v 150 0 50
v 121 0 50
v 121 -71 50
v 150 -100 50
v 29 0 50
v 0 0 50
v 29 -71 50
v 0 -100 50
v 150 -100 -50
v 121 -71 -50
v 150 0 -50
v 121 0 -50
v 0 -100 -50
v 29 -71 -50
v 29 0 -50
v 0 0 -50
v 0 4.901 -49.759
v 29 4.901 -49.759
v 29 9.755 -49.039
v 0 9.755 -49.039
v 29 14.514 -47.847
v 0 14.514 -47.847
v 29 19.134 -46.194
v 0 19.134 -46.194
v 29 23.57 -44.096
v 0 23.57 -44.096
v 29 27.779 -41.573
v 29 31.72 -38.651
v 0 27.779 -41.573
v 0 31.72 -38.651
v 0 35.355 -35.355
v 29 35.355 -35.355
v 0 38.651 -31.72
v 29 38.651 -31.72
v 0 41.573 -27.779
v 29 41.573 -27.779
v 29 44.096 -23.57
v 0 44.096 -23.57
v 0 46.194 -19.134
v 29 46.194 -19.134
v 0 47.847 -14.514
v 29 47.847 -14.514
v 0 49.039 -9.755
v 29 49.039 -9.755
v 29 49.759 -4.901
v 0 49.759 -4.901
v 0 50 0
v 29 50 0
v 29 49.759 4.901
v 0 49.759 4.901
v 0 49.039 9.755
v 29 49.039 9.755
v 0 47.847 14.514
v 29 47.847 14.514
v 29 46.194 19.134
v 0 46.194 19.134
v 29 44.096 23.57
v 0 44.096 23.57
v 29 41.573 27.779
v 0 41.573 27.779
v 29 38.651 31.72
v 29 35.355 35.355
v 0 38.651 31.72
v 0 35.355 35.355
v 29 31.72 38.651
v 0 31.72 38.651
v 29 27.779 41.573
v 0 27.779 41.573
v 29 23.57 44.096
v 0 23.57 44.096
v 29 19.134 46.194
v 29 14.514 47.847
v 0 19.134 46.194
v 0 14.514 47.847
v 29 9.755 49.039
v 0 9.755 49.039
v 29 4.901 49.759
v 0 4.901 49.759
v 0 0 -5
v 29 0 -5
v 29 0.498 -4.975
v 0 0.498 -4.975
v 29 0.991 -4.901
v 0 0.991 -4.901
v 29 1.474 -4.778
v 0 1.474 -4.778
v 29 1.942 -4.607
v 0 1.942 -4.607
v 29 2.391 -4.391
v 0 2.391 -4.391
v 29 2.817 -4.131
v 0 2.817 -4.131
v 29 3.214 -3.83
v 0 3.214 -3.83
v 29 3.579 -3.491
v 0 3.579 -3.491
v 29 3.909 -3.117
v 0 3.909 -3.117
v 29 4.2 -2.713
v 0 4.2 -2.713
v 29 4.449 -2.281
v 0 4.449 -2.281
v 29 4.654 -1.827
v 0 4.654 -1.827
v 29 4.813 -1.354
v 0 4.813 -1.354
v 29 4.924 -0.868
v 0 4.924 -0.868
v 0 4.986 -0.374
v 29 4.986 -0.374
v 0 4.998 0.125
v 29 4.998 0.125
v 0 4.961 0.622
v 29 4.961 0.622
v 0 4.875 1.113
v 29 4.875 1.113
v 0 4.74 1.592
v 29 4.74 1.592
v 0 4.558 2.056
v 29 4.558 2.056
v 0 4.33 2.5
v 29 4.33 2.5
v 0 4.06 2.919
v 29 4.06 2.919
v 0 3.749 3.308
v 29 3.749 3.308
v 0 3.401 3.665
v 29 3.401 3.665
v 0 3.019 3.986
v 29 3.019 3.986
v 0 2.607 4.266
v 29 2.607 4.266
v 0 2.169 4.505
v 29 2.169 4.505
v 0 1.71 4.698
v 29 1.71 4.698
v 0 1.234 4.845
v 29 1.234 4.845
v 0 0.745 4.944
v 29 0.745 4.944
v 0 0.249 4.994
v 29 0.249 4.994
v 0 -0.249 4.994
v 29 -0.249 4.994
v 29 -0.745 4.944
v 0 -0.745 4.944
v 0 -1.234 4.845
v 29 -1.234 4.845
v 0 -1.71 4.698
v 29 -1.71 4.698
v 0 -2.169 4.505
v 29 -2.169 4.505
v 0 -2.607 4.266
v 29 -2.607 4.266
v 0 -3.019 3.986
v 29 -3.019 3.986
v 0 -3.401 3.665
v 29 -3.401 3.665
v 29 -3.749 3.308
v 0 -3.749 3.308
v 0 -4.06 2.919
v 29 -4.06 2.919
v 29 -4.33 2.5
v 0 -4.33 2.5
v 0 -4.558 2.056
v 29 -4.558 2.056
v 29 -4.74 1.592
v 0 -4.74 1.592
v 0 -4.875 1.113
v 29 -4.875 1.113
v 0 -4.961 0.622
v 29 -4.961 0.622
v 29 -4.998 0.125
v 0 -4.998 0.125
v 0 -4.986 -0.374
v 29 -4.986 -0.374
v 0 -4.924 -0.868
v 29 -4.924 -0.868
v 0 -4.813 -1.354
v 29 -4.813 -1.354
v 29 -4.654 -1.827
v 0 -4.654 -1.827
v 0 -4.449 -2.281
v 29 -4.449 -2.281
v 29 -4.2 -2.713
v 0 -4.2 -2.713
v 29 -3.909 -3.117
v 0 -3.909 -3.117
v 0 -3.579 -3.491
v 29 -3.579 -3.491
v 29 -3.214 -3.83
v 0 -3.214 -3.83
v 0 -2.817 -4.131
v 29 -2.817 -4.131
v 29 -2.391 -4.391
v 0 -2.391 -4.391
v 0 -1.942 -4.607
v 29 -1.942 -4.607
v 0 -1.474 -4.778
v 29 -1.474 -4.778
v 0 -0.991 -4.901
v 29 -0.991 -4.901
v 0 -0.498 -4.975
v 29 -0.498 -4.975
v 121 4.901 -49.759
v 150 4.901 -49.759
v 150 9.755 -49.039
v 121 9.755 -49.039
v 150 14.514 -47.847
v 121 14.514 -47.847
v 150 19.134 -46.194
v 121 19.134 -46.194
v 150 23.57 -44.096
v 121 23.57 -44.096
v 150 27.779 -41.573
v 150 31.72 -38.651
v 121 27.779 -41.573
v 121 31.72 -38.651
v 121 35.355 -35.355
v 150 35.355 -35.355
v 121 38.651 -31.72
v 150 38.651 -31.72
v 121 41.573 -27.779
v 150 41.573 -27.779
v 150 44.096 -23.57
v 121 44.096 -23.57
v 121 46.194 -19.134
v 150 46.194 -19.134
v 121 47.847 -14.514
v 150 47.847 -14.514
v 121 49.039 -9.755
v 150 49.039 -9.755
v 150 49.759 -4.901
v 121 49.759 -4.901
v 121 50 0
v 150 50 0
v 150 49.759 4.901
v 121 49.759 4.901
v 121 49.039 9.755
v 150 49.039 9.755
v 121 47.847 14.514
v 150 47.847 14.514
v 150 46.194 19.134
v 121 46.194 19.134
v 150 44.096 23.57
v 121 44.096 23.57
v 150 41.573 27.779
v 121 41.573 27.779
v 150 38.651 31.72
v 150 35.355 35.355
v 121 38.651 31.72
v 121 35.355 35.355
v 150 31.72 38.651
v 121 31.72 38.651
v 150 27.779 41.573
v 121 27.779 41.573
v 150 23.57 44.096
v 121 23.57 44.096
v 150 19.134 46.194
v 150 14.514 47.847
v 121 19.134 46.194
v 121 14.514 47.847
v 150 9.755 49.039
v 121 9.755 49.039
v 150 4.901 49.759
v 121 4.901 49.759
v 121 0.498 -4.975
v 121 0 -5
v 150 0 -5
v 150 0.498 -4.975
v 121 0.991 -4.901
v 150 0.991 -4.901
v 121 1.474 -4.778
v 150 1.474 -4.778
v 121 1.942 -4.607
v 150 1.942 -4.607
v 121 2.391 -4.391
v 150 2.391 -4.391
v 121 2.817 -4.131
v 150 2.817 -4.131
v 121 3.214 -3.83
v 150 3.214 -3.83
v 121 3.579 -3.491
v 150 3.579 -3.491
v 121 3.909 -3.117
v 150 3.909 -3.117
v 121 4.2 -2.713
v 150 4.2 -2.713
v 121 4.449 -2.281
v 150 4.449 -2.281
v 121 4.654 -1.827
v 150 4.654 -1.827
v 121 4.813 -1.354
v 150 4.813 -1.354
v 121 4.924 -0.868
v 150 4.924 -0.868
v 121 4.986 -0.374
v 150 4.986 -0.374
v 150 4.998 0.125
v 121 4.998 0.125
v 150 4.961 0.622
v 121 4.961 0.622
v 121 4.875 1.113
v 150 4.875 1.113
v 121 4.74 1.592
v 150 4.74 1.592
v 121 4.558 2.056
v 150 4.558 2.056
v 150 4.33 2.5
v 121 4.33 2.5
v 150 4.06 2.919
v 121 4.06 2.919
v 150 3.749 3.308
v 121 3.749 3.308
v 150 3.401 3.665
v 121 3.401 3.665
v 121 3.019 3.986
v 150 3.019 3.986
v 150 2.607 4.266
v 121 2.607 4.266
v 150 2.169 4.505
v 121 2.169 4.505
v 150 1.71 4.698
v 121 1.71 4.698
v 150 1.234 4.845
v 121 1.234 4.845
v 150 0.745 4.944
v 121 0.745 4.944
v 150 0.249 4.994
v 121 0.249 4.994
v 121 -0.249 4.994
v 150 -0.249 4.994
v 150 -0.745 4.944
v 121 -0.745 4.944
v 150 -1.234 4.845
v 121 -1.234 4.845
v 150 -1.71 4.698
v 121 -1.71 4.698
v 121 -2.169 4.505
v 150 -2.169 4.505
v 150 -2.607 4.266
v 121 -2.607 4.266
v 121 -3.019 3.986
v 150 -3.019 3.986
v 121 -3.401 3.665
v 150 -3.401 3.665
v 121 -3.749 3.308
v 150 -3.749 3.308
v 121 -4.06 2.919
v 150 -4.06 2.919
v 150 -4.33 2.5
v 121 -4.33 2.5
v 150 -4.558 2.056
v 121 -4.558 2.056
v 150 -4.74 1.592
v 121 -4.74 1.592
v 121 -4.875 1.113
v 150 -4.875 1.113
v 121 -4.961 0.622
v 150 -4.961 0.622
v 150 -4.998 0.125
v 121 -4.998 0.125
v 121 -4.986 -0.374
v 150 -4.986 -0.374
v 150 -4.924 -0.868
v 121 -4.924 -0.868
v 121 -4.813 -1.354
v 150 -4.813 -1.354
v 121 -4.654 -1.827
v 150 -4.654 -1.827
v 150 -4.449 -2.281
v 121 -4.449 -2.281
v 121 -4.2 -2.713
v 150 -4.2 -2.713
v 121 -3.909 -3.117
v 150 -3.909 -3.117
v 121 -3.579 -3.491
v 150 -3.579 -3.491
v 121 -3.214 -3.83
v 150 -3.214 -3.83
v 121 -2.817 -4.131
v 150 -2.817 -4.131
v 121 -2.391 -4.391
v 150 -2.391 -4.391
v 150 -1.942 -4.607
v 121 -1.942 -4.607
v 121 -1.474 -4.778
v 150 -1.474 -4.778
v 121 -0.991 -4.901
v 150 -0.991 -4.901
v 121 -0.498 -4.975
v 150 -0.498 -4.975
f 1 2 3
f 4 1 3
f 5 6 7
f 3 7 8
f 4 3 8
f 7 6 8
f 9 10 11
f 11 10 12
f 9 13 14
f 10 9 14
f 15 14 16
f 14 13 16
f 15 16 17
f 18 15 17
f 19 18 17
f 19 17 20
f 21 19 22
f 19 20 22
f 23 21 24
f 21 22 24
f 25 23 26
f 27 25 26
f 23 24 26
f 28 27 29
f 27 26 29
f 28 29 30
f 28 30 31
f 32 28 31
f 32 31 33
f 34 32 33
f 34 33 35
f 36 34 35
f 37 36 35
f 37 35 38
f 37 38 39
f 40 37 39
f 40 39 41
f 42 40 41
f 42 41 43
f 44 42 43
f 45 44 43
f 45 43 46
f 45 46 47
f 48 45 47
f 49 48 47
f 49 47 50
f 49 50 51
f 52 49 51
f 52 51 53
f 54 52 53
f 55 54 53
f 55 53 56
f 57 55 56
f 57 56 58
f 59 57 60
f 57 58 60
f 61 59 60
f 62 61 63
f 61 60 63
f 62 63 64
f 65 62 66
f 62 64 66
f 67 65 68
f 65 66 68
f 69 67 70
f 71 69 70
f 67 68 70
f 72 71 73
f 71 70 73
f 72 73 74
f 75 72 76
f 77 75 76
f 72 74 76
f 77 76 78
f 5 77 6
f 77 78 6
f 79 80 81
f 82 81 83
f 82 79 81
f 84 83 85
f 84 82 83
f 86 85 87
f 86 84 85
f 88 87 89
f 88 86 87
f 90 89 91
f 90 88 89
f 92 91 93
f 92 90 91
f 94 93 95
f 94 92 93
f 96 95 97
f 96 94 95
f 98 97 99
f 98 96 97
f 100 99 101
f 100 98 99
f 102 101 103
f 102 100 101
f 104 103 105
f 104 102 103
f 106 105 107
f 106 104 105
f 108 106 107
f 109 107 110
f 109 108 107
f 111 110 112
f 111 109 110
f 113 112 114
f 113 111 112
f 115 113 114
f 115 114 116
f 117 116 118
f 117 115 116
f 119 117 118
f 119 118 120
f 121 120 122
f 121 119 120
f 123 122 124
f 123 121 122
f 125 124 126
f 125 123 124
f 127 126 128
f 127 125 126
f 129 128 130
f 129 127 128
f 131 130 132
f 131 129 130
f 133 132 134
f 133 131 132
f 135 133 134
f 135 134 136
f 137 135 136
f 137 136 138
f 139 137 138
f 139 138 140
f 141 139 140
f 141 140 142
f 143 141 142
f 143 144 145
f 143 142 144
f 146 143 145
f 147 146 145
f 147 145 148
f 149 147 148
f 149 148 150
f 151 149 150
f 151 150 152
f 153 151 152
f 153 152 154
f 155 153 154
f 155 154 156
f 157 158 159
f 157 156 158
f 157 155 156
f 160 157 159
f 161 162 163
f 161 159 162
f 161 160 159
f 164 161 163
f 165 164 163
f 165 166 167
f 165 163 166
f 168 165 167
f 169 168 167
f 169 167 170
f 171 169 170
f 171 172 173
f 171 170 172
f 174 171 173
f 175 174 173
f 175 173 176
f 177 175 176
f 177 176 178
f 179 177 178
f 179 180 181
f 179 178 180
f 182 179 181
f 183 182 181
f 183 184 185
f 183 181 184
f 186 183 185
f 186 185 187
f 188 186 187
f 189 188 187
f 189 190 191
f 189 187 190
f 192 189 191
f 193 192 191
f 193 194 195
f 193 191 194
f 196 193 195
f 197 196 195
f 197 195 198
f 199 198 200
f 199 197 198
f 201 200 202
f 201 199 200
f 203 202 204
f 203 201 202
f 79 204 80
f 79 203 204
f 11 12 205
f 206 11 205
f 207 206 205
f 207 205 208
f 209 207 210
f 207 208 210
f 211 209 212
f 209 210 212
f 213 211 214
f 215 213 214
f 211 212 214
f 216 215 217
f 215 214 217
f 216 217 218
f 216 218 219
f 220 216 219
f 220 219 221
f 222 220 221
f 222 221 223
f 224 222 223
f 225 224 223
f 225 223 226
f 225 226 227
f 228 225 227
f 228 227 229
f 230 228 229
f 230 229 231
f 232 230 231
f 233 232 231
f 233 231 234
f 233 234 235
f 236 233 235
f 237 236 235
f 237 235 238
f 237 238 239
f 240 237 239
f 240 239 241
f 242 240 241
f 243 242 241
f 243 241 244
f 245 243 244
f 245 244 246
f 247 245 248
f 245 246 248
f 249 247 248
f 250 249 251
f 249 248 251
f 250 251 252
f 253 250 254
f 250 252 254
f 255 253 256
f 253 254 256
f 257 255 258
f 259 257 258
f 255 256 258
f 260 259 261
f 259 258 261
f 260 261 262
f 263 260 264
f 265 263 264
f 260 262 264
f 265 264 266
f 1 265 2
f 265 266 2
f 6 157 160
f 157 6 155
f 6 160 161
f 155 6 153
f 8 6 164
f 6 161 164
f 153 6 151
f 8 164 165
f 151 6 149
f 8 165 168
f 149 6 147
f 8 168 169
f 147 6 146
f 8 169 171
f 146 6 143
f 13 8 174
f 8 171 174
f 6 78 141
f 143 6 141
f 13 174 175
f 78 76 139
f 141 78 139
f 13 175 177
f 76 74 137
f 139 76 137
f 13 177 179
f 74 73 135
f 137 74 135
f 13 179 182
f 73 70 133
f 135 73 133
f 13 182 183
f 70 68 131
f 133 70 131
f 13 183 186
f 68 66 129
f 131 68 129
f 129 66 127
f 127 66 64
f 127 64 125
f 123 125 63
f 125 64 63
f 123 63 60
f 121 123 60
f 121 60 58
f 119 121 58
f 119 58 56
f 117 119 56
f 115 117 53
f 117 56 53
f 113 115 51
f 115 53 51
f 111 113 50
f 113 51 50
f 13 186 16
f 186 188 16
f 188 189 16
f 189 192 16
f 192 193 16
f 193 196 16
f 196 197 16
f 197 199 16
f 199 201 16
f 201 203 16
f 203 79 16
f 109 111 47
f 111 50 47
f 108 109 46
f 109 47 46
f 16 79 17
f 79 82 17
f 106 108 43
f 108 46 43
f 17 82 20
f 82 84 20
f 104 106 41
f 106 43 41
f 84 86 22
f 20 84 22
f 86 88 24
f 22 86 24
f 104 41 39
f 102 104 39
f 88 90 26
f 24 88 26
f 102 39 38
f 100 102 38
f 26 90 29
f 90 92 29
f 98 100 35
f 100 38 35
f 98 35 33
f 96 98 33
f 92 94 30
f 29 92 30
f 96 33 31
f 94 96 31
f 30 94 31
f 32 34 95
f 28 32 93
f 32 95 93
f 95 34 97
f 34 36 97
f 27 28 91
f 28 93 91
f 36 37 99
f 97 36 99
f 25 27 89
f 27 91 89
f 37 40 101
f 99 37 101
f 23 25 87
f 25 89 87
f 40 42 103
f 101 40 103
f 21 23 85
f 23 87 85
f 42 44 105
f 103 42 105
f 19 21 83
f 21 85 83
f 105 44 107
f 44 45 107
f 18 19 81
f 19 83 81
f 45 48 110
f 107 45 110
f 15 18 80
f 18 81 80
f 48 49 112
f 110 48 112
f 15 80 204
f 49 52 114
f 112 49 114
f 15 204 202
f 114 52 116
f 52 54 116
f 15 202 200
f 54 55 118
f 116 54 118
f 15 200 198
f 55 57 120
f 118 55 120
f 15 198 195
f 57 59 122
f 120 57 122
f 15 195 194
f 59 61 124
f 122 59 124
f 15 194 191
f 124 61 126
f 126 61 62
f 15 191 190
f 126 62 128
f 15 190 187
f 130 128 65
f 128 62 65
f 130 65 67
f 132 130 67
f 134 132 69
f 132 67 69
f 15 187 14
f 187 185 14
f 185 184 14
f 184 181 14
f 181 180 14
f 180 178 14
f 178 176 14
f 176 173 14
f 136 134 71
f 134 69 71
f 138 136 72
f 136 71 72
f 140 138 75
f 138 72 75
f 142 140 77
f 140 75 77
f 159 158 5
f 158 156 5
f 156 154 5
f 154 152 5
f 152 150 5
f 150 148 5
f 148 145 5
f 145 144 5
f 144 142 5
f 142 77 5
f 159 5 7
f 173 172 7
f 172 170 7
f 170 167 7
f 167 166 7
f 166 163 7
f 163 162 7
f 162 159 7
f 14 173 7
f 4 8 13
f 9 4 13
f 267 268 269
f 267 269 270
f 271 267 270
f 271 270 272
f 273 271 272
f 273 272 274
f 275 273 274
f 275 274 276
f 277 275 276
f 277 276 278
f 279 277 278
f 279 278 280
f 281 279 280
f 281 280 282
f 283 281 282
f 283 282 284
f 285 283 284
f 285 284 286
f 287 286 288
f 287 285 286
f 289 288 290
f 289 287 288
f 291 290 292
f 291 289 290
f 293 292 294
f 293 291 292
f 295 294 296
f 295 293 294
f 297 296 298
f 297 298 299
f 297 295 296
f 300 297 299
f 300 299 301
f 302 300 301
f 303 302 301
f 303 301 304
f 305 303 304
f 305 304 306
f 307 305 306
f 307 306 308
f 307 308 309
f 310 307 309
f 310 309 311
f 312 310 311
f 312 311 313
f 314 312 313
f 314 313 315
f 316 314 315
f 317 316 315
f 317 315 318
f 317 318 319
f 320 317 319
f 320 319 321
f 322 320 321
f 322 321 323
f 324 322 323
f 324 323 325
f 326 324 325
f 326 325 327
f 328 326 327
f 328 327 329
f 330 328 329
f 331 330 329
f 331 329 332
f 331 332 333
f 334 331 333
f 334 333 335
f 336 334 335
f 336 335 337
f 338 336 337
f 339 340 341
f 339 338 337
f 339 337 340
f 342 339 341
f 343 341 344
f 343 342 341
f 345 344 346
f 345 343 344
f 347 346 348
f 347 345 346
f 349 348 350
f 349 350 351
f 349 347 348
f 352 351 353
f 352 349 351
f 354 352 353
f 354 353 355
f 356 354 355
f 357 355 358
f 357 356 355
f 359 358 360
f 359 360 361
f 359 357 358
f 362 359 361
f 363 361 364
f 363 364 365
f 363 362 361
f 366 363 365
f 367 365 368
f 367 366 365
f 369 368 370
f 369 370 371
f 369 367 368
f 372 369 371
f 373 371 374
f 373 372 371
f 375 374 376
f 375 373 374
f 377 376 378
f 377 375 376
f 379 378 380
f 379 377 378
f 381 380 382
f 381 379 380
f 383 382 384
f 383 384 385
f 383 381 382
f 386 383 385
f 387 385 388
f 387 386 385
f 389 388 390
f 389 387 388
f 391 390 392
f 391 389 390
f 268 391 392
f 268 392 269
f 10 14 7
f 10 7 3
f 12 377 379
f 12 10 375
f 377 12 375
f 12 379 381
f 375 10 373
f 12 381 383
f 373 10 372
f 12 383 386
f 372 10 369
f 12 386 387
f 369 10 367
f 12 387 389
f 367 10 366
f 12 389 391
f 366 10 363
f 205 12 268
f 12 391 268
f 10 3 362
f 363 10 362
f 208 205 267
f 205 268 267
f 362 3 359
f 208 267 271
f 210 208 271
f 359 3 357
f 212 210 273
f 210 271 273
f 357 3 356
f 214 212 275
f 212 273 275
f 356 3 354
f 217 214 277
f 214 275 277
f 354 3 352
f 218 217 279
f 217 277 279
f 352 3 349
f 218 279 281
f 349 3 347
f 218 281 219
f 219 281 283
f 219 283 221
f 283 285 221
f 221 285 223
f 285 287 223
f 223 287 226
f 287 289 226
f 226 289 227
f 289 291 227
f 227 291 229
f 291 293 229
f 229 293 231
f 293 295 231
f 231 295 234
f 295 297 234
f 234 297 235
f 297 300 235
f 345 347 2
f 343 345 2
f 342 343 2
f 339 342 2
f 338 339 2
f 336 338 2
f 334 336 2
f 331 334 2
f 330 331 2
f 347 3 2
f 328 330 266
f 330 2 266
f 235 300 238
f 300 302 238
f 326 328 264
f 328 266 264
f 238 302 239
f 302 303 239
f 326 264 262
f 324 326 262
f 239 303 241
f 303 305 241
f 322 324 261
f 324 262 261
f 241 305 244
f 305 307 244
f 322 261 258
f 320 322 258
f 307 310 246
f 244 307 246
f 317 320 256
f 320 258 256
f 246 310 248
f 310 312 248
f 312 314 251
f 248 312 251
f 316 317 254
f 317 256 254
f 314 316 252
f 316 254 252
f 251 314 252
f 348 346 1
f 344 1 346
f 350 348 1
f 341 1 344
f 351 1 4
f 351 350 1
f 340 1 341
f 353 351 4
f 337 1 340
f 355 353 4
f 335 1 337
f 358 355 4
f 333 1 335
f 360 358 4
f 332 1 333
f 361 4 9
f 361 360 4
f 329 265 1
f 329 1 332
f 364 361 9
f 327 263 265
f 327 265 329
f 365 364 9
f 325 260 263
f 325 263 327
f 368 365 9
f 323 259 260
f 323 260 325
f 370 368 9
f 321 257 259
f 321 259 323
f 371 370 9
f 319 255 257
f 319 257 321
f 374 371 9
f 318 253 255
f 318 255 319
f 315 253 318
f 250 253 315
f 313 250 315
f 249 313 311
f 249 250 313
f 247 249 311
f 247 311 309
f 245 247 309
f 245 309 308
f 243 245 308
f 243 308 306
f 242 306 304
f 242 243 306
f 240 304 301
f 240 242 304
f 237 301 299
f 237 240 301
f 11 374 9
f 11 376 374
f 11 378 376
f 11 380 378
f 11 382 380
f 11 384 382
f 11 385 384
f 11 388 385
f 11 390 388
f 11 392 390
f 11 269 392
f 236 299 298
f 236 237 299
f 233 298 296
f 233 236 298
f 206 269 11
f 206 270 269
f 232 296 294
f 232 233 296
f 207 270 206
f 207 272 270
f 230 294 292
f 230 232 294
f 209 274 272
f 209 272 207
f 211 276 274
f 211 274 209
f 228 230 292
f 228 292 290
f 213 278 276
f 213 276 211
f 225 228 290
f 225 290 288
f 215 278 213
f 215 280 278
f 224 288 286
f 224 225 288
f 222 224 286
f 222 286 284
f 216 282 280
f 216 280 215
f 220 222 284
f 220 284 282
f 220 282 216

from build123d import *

# Parameters (mm, degrees)
SKIZZE1_R                       = 50
SKIZZE1_R_2                     = 5
AUFSATZ_LINEAR_AUSTRAGEN1_DEPTH = 150
SKIZZE2_W                       = 92
SKIZZE2_H                       = 50
SKIZZE2_H_2                     = 71
SCHNITT_LINEAR_AUSTRAGEN1_DEPTH = 207.155281281


with BuildPart() as part:
    # Skizze1 → Aufsatz-Linear austragen1 (new body)
    # profile 1 of 2: a face of its own
    with BuildSketch(Plane(origin=(0, 0, 0), x_dir=(0, 0, -1), z_dir=(1, 0, 0))):
        Circle(SKIZZE1_R)
        Circle(SKIZZE1_R_2, mode=Mode.SUBTRACT)
    # profile 2 of 2: a face of its own
    with BuildSketch(Plane(origin=(0, 0, 0), x_dir=(0, 0, -1), z_dir=(1, 0, 0))):
        with BuildLine():
            ThreePointArc((50, 0), (0, -50), (-50, 0))
            Line((-50, 0), (-50, -100))
            Line((-50, -100), (50, -100))
            Line((50, -100), (50, 0))
        make_face()
    extrude(amount=AUFSATZ_LINEAR_AUSTRAGEN1_DEPTH)

    # Skizze2 → Schnitt-Linear austragen1 (cut, through all)
    with BuildSketch(Plane.XY.offset(50)):
        with Locations((75, 25)):
            Rectangle(SKIZZE2_W, SKIZZE2_H)
        with Locations((75, -35.5)):
            Rectangle(SKIZZE2_W, SKIZZE2_H_2)
    extrude(amount=-SCHNITT_LINEAR_AUSTRAGEN1_DEPTH, mode=Mode.SUBTRACT)


solid = part.part
